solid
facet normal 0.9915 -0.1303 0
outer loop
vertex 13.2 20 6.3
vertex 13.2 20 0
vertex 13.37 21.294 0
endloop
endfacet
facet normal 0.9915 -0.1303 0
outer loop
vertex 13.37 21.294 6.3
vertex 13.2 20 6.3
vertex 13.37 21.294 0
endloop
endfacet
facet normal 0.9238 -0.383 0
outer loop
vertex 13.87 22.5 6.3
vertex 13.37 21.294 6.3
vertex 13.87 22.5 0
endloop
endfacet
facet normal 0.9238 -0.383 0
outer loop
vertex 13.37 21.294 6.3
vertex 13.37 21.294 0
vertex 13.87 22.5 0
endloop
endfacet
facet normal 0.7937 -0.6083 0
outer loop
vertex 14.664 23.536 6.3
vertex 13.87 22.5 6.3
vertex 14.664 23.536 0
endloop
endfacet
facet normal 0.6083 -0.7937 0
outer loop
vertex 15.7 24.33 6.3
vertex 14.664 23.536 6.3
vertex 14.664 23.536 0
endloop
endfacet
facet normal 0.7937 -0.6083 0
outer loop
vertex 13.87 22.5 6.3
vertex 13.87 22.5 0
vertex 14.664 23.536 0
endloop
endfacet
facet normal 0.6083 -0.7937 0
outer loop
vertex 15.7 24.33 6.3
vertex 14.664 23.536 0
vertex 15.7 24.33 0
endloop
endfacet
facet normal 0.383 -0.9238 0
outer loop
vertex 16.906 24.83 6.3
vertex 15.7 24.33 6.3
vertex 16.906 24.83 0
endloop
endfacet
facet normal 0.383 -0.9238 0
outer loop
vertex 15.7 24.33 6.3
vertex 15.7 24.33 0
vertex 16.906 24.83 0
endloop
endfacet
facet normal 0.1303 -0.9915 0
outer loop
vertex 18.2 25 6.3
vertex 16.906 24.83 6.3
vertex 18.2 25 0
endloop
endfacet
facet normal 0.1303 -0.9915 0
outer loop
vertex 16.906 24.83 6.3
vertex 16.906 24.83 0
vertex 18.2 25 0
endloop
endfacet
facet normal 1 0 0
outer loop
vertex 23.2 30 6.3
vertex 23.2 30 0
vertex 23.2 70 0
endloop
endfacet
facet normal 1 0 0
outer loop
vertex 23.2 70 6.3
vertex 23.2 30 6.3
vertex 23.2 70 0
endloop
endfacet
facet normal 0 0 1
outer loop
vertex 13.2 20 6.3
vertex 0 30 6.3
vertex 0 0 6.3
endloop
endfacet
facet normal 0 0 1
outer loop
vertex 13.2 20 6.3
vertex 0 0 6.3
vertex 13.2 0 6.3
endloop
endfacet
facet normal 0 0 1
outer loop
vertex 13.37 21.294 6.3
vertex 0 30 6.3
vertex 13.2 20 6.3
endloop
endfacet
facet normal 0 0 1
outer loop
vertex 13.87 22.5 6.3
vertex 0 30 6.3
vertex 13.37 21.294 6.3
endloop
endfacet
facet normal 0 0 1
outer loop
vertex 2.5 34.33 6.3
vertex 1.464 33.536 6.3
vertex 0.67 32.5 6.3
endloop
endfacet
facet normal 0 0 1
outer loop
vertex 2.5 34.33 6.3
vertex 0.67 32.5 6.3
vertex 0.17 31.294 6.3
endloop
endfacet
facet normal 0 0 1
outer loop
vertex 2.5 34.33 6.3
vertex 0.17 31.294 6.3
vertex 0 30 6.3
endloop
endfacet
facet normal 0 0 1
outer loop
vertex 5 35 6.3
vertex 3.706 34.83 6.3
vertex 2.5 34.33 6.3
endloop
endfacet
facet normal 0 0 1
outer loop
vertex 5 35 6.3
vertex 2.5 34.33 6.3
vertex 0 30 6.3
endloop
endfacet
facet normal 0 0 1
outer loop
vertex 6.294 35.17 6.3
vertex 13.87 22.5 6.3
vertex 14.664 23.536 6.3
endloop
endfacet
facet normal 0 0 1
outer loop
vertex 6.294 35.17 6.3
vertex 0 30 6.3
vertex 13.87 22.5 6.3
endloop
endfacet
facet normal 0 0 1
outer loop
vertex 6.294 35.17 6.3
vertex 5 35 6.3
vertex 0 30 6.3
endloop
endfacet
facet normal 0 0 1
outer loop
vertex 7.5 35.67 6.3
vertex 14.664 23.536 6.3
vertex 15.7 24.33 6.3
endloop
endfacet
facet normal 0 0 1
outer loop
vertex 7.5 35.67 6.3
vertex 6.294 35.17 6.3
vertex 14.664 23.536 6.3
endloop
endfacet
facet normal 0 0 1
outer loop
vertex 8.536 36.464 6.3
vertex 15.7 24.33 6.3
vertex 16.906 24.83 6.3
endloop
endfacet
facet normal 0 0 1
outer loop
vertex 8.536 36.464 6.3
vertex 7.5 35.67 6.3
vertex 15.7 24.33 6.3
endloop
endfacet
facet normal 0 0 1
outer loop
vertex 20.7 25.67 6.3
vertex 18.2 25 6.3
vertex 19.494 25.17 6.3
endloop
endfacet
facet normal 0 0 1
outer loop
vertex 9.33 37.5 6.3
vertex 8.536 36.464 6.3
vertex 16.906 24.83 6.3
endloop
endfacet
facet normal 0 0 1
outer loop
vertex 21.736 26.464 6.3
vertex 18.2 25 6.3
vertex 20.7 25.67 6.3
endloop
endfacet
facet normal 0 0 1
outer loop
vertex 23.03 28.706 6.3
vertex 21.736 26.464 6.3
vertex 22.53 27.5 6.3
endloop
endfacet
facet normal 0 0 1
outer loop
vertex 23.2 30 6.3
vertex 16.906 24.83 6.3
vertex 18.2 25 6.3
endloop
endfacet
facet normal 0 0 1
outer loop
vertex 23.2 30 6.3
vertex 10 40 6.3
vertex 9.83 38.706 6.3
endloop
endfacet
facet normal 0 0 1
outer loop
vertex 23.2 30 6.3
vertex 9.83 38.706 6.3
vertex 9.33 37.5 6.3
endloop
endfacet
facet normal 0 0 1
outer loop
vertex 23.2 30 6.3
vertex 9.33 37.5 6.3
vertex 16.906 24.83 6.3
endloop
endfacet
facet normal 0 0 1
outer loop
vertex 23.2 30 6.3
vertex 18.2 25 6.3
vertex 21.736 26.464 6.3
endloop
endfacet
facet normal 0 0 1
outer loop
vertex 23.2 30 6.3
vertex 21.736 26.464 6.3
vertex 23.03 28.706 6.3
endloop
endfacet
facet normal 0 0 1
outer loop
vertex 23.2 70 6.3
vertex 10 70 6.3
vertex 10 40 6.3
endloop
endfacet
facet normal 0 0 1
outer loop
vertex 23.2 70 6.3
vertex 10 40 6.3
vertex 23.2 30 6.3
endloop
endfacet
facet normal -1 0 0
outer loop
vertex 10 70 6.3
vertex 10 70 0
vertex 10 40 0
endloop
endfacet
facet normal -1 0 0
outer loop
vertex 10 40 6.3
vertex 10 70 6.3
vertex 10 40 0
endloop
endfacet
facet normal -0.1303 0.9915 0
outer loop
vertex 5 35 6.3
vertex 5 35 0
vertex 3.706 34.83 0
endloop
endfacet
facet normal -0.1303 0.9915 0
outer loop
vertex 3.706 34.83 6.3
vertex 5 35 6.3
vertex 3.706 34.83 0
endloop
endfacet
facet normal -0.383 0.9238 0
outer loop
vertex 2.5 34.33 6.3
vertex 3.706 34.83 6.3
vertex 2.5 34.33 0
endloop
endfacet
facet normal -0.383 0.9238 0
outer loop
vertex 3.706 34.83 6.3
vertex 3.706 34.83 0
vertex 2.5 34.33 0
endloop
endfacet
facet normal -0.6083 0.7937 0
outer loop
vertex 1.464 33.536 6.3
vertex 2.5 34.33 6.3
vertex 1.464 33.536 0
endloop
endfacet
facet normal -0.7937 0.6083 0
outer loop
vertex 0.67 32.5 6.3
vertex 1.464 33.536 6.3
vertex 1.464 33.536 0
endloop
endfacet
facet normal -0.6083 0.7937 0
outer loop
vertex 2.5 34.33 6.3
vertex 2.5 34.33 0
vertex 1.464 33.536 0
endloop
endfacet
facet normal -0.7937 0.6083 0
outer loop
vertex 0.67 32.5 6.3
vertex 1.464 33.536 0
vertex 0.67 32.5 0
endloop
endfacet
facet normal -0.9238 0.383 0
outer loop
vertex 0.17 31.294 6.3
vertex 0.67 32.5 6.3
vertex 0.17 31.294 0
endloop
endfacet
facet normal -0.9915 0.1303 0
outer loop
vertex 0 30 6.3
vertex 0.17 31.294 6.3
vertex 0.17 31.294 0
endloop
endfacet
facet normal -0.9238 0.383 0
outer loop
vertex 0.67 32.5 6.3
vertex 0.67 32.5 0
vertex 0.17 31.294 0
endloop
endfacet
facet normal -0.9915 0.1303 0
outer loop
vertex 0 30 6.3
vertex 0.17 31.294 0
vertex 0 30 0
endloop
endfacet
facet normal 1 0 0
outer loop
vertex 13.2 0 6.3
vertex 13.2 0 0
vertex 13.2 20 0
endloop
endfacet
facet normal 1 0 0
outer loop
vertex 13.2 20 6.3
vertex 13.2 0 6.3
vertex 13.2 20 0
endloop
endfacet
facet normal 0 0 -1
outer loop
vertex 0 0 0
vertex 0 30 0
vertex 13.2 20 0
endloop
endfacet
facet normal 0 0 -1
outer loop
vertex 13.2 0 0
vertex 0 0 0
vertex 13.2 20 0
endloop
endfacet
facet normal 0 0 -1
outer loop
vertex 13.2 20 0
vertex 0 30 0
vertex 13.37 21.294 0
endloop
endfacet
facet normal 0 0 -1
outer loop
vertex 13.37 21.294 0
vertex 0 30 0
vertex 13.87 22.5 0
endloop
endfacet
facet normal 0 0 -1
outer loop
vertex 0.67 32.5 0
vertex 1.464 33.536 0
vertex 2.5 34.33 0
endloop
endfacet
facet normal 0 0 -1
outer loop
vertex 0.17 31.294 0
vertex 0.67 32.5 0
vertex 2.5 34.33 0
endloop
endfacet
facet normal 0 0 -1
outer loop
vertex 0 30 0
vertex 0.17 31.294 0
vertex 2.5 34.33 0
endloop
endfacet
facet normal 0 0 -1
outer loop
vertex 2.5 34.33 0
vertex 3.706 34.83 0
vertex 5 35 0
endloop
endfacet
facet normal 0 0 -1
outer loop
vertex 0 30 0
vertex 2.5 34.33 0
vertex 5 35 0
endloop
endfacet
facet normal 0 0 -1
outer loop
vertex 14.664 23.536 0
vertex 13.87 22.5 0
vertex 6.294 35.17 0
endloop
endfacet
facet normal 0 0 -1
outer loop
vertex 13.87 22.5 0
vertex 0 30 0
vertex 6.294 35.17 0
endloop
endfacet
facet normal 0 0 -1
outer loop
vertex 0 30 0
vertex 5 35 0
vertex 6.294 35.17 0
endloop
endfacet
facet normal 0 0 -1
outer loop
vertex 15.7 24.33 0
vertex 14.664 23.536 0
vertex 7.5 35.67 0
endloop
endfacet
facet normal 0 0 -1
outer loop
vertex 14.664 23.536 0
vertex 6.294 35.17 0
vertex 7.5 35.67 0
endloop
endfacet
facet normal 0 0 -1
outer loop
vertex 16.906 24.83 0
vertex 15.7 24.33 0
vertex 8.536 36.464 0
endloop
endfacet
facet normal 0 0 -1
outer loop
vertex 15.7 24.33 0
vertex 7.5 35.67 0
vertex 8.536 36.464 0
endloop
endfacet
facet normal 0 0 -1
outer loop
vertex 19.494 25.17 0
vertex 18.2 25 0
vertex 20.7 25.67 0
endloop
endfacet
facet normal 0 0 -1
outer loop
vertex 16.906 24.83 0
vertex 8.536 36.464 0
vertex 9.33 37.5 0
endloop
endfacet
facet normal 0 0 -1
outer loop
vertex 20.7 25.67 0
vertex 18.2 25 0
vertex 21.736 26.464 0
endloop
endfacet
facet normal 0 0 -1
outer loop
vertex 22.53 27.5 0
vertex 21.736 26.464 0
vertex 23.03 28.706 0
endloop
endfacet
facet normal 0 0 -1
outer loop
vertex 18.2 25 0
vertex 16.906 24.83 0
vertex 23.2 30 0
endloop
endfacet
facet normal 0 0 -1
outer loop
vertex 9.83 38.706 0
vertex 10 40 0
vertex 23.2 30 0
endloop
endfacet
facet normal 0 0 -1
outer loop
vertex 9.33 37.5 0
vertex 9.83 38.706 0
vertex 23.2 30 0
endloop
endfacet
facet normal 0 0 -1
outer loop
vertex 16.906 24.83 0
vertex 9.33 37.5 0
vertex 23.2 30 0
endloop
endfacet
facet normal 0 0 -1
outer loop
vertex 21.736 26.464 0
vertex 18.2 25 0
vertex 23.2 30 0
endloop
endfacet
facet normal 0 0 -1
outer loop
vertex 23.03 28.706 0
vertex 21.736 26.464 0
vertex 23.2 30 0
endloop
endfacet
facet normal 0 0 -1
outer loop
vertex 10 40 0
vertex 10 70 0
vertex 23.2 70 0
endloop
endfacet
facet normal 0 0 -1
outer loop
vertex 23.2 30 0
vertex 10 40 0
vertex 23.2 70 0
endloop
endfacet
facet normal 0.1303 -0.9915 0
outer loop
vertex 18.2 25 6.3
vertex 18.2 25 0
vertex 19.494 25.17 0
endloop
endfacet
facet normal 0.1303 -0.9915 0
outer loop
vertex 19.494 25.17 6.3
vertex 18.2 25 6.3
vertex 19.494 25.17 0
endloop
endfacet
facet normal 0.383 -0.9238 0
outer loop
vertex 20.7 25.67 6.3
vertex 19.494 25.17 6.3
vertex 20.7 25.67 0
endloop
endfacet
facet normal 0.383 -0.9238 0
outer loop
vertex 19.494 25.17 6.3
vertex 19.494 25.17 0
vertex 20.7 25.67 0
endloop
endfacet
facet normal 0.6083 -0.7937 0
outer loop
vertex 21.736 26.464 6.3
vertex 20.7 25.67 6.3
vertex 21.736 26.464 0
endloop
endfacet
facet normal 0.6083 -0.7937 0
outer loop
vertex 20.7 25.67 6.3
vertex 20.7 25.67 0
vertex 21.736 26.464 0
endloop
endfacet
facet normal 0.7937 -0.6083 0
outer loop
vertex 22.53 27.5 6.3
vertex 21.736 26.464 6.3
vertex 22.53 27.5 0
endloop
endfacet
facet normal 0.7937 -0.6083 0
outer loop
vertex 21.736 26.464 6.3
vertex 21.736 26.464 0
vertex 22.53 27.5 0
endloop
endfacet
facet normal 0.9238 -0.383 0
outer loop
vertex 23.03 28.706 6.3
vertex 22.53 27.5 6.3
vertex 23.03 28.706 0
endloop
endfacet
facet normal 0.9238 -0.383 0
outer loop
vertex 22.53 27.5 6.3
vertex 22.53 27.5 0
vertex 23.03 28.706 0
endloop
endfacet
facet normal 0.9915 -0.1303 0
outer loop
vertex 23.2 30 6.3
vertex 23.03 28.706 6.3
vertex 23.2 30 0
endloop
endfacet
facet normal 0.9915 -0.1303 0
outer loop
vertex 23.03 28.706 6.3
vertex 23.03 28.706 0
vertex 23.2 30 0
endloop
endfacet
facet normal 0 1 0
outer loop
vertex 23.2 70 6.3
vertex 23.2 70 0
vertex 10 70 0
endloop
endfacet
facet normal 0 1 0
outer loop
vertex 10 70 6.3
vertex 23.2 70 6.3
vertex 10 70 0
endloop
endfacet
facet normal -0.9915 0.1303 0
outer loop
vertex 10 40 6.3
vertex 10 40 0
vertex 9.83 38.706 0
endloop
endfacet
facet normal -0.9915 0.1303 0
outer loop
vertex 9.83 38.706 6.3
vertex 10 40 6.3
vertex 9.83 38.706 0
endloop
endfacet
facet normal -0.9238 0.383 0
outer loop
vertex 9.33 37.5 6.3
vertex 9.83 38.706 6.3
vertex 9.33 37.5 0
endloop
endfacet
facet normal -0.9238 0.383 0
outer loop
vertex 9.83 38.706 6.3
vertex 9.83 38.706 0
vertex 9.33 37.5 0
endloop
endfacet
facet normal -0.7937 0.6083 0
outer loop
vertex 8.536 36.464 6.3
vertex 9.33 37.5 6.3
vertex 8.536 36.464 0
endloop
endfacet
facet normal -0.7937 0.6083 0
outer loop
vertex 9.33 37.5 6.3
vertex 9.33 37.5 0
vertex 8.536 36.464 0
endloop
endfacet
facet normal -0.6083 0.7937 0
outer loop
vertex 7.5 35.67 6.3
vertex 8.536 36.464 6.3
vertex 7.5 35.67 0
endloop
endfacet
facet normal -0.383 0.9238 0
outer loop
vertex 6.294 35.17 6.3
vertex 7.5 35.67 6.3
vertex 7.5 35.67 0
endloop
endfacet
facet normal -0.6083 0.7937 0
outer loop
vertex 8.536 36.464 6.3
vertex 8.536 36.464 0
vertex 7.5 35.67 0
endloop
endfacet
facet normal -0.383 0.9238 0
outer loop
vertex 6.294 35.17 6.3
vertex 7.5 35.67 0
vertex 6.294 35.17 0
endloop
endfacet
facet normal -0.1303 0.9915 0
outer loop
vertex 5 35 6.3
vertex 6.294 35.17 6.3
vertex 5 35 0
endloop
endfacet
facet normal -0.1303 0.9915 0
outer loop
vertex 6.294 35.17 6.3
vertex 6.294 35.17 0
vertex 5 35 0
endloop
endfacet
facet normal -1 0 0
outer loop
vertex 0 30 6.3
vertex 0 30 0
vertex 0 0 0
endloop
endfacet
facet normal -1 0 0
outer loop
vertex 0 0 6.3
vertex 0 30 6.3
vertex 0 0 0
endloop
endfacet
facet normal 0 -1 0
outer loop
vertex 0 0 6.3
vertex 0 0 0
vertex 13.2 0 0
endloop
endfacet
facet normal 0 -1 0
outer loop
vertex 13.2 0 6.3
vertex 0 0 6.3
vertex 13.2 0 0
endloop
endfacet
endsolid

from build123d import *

# Parameters (mm, degrees)
F1_DEPTH = 6.3


with BuildPart() as f1:
    # F0 (on Top) → F1 (new body)
    with BuildSketch(Plane.XY):
        with BuildLine():
            Line((0, 30), (0, 0))
            Line((0, 0), (13.2, 0))
            Line((13.2, 0), (13.2, 20))
            ThreePointArc((13.2, 20), (14.664466, 23.535534), (18.2, 25))
            ThreePointArc((18.2, 25), (21.735534, 26.464466), (23.2, 30))
            Line((23.2, 30), (23.2, 70))
            Line((23.2, 70), (10, 70))
            Line((10, 70), (10, 40))
            ThreePointArc((10, 40), (8.535534, 36.464466), (5, 35))
            ThreePointArc((5, 35), (1.464466, 33.535534), (0, 30))
        make_face()
    extrude(amount=F1_DEPTH)


solid = f1.part
